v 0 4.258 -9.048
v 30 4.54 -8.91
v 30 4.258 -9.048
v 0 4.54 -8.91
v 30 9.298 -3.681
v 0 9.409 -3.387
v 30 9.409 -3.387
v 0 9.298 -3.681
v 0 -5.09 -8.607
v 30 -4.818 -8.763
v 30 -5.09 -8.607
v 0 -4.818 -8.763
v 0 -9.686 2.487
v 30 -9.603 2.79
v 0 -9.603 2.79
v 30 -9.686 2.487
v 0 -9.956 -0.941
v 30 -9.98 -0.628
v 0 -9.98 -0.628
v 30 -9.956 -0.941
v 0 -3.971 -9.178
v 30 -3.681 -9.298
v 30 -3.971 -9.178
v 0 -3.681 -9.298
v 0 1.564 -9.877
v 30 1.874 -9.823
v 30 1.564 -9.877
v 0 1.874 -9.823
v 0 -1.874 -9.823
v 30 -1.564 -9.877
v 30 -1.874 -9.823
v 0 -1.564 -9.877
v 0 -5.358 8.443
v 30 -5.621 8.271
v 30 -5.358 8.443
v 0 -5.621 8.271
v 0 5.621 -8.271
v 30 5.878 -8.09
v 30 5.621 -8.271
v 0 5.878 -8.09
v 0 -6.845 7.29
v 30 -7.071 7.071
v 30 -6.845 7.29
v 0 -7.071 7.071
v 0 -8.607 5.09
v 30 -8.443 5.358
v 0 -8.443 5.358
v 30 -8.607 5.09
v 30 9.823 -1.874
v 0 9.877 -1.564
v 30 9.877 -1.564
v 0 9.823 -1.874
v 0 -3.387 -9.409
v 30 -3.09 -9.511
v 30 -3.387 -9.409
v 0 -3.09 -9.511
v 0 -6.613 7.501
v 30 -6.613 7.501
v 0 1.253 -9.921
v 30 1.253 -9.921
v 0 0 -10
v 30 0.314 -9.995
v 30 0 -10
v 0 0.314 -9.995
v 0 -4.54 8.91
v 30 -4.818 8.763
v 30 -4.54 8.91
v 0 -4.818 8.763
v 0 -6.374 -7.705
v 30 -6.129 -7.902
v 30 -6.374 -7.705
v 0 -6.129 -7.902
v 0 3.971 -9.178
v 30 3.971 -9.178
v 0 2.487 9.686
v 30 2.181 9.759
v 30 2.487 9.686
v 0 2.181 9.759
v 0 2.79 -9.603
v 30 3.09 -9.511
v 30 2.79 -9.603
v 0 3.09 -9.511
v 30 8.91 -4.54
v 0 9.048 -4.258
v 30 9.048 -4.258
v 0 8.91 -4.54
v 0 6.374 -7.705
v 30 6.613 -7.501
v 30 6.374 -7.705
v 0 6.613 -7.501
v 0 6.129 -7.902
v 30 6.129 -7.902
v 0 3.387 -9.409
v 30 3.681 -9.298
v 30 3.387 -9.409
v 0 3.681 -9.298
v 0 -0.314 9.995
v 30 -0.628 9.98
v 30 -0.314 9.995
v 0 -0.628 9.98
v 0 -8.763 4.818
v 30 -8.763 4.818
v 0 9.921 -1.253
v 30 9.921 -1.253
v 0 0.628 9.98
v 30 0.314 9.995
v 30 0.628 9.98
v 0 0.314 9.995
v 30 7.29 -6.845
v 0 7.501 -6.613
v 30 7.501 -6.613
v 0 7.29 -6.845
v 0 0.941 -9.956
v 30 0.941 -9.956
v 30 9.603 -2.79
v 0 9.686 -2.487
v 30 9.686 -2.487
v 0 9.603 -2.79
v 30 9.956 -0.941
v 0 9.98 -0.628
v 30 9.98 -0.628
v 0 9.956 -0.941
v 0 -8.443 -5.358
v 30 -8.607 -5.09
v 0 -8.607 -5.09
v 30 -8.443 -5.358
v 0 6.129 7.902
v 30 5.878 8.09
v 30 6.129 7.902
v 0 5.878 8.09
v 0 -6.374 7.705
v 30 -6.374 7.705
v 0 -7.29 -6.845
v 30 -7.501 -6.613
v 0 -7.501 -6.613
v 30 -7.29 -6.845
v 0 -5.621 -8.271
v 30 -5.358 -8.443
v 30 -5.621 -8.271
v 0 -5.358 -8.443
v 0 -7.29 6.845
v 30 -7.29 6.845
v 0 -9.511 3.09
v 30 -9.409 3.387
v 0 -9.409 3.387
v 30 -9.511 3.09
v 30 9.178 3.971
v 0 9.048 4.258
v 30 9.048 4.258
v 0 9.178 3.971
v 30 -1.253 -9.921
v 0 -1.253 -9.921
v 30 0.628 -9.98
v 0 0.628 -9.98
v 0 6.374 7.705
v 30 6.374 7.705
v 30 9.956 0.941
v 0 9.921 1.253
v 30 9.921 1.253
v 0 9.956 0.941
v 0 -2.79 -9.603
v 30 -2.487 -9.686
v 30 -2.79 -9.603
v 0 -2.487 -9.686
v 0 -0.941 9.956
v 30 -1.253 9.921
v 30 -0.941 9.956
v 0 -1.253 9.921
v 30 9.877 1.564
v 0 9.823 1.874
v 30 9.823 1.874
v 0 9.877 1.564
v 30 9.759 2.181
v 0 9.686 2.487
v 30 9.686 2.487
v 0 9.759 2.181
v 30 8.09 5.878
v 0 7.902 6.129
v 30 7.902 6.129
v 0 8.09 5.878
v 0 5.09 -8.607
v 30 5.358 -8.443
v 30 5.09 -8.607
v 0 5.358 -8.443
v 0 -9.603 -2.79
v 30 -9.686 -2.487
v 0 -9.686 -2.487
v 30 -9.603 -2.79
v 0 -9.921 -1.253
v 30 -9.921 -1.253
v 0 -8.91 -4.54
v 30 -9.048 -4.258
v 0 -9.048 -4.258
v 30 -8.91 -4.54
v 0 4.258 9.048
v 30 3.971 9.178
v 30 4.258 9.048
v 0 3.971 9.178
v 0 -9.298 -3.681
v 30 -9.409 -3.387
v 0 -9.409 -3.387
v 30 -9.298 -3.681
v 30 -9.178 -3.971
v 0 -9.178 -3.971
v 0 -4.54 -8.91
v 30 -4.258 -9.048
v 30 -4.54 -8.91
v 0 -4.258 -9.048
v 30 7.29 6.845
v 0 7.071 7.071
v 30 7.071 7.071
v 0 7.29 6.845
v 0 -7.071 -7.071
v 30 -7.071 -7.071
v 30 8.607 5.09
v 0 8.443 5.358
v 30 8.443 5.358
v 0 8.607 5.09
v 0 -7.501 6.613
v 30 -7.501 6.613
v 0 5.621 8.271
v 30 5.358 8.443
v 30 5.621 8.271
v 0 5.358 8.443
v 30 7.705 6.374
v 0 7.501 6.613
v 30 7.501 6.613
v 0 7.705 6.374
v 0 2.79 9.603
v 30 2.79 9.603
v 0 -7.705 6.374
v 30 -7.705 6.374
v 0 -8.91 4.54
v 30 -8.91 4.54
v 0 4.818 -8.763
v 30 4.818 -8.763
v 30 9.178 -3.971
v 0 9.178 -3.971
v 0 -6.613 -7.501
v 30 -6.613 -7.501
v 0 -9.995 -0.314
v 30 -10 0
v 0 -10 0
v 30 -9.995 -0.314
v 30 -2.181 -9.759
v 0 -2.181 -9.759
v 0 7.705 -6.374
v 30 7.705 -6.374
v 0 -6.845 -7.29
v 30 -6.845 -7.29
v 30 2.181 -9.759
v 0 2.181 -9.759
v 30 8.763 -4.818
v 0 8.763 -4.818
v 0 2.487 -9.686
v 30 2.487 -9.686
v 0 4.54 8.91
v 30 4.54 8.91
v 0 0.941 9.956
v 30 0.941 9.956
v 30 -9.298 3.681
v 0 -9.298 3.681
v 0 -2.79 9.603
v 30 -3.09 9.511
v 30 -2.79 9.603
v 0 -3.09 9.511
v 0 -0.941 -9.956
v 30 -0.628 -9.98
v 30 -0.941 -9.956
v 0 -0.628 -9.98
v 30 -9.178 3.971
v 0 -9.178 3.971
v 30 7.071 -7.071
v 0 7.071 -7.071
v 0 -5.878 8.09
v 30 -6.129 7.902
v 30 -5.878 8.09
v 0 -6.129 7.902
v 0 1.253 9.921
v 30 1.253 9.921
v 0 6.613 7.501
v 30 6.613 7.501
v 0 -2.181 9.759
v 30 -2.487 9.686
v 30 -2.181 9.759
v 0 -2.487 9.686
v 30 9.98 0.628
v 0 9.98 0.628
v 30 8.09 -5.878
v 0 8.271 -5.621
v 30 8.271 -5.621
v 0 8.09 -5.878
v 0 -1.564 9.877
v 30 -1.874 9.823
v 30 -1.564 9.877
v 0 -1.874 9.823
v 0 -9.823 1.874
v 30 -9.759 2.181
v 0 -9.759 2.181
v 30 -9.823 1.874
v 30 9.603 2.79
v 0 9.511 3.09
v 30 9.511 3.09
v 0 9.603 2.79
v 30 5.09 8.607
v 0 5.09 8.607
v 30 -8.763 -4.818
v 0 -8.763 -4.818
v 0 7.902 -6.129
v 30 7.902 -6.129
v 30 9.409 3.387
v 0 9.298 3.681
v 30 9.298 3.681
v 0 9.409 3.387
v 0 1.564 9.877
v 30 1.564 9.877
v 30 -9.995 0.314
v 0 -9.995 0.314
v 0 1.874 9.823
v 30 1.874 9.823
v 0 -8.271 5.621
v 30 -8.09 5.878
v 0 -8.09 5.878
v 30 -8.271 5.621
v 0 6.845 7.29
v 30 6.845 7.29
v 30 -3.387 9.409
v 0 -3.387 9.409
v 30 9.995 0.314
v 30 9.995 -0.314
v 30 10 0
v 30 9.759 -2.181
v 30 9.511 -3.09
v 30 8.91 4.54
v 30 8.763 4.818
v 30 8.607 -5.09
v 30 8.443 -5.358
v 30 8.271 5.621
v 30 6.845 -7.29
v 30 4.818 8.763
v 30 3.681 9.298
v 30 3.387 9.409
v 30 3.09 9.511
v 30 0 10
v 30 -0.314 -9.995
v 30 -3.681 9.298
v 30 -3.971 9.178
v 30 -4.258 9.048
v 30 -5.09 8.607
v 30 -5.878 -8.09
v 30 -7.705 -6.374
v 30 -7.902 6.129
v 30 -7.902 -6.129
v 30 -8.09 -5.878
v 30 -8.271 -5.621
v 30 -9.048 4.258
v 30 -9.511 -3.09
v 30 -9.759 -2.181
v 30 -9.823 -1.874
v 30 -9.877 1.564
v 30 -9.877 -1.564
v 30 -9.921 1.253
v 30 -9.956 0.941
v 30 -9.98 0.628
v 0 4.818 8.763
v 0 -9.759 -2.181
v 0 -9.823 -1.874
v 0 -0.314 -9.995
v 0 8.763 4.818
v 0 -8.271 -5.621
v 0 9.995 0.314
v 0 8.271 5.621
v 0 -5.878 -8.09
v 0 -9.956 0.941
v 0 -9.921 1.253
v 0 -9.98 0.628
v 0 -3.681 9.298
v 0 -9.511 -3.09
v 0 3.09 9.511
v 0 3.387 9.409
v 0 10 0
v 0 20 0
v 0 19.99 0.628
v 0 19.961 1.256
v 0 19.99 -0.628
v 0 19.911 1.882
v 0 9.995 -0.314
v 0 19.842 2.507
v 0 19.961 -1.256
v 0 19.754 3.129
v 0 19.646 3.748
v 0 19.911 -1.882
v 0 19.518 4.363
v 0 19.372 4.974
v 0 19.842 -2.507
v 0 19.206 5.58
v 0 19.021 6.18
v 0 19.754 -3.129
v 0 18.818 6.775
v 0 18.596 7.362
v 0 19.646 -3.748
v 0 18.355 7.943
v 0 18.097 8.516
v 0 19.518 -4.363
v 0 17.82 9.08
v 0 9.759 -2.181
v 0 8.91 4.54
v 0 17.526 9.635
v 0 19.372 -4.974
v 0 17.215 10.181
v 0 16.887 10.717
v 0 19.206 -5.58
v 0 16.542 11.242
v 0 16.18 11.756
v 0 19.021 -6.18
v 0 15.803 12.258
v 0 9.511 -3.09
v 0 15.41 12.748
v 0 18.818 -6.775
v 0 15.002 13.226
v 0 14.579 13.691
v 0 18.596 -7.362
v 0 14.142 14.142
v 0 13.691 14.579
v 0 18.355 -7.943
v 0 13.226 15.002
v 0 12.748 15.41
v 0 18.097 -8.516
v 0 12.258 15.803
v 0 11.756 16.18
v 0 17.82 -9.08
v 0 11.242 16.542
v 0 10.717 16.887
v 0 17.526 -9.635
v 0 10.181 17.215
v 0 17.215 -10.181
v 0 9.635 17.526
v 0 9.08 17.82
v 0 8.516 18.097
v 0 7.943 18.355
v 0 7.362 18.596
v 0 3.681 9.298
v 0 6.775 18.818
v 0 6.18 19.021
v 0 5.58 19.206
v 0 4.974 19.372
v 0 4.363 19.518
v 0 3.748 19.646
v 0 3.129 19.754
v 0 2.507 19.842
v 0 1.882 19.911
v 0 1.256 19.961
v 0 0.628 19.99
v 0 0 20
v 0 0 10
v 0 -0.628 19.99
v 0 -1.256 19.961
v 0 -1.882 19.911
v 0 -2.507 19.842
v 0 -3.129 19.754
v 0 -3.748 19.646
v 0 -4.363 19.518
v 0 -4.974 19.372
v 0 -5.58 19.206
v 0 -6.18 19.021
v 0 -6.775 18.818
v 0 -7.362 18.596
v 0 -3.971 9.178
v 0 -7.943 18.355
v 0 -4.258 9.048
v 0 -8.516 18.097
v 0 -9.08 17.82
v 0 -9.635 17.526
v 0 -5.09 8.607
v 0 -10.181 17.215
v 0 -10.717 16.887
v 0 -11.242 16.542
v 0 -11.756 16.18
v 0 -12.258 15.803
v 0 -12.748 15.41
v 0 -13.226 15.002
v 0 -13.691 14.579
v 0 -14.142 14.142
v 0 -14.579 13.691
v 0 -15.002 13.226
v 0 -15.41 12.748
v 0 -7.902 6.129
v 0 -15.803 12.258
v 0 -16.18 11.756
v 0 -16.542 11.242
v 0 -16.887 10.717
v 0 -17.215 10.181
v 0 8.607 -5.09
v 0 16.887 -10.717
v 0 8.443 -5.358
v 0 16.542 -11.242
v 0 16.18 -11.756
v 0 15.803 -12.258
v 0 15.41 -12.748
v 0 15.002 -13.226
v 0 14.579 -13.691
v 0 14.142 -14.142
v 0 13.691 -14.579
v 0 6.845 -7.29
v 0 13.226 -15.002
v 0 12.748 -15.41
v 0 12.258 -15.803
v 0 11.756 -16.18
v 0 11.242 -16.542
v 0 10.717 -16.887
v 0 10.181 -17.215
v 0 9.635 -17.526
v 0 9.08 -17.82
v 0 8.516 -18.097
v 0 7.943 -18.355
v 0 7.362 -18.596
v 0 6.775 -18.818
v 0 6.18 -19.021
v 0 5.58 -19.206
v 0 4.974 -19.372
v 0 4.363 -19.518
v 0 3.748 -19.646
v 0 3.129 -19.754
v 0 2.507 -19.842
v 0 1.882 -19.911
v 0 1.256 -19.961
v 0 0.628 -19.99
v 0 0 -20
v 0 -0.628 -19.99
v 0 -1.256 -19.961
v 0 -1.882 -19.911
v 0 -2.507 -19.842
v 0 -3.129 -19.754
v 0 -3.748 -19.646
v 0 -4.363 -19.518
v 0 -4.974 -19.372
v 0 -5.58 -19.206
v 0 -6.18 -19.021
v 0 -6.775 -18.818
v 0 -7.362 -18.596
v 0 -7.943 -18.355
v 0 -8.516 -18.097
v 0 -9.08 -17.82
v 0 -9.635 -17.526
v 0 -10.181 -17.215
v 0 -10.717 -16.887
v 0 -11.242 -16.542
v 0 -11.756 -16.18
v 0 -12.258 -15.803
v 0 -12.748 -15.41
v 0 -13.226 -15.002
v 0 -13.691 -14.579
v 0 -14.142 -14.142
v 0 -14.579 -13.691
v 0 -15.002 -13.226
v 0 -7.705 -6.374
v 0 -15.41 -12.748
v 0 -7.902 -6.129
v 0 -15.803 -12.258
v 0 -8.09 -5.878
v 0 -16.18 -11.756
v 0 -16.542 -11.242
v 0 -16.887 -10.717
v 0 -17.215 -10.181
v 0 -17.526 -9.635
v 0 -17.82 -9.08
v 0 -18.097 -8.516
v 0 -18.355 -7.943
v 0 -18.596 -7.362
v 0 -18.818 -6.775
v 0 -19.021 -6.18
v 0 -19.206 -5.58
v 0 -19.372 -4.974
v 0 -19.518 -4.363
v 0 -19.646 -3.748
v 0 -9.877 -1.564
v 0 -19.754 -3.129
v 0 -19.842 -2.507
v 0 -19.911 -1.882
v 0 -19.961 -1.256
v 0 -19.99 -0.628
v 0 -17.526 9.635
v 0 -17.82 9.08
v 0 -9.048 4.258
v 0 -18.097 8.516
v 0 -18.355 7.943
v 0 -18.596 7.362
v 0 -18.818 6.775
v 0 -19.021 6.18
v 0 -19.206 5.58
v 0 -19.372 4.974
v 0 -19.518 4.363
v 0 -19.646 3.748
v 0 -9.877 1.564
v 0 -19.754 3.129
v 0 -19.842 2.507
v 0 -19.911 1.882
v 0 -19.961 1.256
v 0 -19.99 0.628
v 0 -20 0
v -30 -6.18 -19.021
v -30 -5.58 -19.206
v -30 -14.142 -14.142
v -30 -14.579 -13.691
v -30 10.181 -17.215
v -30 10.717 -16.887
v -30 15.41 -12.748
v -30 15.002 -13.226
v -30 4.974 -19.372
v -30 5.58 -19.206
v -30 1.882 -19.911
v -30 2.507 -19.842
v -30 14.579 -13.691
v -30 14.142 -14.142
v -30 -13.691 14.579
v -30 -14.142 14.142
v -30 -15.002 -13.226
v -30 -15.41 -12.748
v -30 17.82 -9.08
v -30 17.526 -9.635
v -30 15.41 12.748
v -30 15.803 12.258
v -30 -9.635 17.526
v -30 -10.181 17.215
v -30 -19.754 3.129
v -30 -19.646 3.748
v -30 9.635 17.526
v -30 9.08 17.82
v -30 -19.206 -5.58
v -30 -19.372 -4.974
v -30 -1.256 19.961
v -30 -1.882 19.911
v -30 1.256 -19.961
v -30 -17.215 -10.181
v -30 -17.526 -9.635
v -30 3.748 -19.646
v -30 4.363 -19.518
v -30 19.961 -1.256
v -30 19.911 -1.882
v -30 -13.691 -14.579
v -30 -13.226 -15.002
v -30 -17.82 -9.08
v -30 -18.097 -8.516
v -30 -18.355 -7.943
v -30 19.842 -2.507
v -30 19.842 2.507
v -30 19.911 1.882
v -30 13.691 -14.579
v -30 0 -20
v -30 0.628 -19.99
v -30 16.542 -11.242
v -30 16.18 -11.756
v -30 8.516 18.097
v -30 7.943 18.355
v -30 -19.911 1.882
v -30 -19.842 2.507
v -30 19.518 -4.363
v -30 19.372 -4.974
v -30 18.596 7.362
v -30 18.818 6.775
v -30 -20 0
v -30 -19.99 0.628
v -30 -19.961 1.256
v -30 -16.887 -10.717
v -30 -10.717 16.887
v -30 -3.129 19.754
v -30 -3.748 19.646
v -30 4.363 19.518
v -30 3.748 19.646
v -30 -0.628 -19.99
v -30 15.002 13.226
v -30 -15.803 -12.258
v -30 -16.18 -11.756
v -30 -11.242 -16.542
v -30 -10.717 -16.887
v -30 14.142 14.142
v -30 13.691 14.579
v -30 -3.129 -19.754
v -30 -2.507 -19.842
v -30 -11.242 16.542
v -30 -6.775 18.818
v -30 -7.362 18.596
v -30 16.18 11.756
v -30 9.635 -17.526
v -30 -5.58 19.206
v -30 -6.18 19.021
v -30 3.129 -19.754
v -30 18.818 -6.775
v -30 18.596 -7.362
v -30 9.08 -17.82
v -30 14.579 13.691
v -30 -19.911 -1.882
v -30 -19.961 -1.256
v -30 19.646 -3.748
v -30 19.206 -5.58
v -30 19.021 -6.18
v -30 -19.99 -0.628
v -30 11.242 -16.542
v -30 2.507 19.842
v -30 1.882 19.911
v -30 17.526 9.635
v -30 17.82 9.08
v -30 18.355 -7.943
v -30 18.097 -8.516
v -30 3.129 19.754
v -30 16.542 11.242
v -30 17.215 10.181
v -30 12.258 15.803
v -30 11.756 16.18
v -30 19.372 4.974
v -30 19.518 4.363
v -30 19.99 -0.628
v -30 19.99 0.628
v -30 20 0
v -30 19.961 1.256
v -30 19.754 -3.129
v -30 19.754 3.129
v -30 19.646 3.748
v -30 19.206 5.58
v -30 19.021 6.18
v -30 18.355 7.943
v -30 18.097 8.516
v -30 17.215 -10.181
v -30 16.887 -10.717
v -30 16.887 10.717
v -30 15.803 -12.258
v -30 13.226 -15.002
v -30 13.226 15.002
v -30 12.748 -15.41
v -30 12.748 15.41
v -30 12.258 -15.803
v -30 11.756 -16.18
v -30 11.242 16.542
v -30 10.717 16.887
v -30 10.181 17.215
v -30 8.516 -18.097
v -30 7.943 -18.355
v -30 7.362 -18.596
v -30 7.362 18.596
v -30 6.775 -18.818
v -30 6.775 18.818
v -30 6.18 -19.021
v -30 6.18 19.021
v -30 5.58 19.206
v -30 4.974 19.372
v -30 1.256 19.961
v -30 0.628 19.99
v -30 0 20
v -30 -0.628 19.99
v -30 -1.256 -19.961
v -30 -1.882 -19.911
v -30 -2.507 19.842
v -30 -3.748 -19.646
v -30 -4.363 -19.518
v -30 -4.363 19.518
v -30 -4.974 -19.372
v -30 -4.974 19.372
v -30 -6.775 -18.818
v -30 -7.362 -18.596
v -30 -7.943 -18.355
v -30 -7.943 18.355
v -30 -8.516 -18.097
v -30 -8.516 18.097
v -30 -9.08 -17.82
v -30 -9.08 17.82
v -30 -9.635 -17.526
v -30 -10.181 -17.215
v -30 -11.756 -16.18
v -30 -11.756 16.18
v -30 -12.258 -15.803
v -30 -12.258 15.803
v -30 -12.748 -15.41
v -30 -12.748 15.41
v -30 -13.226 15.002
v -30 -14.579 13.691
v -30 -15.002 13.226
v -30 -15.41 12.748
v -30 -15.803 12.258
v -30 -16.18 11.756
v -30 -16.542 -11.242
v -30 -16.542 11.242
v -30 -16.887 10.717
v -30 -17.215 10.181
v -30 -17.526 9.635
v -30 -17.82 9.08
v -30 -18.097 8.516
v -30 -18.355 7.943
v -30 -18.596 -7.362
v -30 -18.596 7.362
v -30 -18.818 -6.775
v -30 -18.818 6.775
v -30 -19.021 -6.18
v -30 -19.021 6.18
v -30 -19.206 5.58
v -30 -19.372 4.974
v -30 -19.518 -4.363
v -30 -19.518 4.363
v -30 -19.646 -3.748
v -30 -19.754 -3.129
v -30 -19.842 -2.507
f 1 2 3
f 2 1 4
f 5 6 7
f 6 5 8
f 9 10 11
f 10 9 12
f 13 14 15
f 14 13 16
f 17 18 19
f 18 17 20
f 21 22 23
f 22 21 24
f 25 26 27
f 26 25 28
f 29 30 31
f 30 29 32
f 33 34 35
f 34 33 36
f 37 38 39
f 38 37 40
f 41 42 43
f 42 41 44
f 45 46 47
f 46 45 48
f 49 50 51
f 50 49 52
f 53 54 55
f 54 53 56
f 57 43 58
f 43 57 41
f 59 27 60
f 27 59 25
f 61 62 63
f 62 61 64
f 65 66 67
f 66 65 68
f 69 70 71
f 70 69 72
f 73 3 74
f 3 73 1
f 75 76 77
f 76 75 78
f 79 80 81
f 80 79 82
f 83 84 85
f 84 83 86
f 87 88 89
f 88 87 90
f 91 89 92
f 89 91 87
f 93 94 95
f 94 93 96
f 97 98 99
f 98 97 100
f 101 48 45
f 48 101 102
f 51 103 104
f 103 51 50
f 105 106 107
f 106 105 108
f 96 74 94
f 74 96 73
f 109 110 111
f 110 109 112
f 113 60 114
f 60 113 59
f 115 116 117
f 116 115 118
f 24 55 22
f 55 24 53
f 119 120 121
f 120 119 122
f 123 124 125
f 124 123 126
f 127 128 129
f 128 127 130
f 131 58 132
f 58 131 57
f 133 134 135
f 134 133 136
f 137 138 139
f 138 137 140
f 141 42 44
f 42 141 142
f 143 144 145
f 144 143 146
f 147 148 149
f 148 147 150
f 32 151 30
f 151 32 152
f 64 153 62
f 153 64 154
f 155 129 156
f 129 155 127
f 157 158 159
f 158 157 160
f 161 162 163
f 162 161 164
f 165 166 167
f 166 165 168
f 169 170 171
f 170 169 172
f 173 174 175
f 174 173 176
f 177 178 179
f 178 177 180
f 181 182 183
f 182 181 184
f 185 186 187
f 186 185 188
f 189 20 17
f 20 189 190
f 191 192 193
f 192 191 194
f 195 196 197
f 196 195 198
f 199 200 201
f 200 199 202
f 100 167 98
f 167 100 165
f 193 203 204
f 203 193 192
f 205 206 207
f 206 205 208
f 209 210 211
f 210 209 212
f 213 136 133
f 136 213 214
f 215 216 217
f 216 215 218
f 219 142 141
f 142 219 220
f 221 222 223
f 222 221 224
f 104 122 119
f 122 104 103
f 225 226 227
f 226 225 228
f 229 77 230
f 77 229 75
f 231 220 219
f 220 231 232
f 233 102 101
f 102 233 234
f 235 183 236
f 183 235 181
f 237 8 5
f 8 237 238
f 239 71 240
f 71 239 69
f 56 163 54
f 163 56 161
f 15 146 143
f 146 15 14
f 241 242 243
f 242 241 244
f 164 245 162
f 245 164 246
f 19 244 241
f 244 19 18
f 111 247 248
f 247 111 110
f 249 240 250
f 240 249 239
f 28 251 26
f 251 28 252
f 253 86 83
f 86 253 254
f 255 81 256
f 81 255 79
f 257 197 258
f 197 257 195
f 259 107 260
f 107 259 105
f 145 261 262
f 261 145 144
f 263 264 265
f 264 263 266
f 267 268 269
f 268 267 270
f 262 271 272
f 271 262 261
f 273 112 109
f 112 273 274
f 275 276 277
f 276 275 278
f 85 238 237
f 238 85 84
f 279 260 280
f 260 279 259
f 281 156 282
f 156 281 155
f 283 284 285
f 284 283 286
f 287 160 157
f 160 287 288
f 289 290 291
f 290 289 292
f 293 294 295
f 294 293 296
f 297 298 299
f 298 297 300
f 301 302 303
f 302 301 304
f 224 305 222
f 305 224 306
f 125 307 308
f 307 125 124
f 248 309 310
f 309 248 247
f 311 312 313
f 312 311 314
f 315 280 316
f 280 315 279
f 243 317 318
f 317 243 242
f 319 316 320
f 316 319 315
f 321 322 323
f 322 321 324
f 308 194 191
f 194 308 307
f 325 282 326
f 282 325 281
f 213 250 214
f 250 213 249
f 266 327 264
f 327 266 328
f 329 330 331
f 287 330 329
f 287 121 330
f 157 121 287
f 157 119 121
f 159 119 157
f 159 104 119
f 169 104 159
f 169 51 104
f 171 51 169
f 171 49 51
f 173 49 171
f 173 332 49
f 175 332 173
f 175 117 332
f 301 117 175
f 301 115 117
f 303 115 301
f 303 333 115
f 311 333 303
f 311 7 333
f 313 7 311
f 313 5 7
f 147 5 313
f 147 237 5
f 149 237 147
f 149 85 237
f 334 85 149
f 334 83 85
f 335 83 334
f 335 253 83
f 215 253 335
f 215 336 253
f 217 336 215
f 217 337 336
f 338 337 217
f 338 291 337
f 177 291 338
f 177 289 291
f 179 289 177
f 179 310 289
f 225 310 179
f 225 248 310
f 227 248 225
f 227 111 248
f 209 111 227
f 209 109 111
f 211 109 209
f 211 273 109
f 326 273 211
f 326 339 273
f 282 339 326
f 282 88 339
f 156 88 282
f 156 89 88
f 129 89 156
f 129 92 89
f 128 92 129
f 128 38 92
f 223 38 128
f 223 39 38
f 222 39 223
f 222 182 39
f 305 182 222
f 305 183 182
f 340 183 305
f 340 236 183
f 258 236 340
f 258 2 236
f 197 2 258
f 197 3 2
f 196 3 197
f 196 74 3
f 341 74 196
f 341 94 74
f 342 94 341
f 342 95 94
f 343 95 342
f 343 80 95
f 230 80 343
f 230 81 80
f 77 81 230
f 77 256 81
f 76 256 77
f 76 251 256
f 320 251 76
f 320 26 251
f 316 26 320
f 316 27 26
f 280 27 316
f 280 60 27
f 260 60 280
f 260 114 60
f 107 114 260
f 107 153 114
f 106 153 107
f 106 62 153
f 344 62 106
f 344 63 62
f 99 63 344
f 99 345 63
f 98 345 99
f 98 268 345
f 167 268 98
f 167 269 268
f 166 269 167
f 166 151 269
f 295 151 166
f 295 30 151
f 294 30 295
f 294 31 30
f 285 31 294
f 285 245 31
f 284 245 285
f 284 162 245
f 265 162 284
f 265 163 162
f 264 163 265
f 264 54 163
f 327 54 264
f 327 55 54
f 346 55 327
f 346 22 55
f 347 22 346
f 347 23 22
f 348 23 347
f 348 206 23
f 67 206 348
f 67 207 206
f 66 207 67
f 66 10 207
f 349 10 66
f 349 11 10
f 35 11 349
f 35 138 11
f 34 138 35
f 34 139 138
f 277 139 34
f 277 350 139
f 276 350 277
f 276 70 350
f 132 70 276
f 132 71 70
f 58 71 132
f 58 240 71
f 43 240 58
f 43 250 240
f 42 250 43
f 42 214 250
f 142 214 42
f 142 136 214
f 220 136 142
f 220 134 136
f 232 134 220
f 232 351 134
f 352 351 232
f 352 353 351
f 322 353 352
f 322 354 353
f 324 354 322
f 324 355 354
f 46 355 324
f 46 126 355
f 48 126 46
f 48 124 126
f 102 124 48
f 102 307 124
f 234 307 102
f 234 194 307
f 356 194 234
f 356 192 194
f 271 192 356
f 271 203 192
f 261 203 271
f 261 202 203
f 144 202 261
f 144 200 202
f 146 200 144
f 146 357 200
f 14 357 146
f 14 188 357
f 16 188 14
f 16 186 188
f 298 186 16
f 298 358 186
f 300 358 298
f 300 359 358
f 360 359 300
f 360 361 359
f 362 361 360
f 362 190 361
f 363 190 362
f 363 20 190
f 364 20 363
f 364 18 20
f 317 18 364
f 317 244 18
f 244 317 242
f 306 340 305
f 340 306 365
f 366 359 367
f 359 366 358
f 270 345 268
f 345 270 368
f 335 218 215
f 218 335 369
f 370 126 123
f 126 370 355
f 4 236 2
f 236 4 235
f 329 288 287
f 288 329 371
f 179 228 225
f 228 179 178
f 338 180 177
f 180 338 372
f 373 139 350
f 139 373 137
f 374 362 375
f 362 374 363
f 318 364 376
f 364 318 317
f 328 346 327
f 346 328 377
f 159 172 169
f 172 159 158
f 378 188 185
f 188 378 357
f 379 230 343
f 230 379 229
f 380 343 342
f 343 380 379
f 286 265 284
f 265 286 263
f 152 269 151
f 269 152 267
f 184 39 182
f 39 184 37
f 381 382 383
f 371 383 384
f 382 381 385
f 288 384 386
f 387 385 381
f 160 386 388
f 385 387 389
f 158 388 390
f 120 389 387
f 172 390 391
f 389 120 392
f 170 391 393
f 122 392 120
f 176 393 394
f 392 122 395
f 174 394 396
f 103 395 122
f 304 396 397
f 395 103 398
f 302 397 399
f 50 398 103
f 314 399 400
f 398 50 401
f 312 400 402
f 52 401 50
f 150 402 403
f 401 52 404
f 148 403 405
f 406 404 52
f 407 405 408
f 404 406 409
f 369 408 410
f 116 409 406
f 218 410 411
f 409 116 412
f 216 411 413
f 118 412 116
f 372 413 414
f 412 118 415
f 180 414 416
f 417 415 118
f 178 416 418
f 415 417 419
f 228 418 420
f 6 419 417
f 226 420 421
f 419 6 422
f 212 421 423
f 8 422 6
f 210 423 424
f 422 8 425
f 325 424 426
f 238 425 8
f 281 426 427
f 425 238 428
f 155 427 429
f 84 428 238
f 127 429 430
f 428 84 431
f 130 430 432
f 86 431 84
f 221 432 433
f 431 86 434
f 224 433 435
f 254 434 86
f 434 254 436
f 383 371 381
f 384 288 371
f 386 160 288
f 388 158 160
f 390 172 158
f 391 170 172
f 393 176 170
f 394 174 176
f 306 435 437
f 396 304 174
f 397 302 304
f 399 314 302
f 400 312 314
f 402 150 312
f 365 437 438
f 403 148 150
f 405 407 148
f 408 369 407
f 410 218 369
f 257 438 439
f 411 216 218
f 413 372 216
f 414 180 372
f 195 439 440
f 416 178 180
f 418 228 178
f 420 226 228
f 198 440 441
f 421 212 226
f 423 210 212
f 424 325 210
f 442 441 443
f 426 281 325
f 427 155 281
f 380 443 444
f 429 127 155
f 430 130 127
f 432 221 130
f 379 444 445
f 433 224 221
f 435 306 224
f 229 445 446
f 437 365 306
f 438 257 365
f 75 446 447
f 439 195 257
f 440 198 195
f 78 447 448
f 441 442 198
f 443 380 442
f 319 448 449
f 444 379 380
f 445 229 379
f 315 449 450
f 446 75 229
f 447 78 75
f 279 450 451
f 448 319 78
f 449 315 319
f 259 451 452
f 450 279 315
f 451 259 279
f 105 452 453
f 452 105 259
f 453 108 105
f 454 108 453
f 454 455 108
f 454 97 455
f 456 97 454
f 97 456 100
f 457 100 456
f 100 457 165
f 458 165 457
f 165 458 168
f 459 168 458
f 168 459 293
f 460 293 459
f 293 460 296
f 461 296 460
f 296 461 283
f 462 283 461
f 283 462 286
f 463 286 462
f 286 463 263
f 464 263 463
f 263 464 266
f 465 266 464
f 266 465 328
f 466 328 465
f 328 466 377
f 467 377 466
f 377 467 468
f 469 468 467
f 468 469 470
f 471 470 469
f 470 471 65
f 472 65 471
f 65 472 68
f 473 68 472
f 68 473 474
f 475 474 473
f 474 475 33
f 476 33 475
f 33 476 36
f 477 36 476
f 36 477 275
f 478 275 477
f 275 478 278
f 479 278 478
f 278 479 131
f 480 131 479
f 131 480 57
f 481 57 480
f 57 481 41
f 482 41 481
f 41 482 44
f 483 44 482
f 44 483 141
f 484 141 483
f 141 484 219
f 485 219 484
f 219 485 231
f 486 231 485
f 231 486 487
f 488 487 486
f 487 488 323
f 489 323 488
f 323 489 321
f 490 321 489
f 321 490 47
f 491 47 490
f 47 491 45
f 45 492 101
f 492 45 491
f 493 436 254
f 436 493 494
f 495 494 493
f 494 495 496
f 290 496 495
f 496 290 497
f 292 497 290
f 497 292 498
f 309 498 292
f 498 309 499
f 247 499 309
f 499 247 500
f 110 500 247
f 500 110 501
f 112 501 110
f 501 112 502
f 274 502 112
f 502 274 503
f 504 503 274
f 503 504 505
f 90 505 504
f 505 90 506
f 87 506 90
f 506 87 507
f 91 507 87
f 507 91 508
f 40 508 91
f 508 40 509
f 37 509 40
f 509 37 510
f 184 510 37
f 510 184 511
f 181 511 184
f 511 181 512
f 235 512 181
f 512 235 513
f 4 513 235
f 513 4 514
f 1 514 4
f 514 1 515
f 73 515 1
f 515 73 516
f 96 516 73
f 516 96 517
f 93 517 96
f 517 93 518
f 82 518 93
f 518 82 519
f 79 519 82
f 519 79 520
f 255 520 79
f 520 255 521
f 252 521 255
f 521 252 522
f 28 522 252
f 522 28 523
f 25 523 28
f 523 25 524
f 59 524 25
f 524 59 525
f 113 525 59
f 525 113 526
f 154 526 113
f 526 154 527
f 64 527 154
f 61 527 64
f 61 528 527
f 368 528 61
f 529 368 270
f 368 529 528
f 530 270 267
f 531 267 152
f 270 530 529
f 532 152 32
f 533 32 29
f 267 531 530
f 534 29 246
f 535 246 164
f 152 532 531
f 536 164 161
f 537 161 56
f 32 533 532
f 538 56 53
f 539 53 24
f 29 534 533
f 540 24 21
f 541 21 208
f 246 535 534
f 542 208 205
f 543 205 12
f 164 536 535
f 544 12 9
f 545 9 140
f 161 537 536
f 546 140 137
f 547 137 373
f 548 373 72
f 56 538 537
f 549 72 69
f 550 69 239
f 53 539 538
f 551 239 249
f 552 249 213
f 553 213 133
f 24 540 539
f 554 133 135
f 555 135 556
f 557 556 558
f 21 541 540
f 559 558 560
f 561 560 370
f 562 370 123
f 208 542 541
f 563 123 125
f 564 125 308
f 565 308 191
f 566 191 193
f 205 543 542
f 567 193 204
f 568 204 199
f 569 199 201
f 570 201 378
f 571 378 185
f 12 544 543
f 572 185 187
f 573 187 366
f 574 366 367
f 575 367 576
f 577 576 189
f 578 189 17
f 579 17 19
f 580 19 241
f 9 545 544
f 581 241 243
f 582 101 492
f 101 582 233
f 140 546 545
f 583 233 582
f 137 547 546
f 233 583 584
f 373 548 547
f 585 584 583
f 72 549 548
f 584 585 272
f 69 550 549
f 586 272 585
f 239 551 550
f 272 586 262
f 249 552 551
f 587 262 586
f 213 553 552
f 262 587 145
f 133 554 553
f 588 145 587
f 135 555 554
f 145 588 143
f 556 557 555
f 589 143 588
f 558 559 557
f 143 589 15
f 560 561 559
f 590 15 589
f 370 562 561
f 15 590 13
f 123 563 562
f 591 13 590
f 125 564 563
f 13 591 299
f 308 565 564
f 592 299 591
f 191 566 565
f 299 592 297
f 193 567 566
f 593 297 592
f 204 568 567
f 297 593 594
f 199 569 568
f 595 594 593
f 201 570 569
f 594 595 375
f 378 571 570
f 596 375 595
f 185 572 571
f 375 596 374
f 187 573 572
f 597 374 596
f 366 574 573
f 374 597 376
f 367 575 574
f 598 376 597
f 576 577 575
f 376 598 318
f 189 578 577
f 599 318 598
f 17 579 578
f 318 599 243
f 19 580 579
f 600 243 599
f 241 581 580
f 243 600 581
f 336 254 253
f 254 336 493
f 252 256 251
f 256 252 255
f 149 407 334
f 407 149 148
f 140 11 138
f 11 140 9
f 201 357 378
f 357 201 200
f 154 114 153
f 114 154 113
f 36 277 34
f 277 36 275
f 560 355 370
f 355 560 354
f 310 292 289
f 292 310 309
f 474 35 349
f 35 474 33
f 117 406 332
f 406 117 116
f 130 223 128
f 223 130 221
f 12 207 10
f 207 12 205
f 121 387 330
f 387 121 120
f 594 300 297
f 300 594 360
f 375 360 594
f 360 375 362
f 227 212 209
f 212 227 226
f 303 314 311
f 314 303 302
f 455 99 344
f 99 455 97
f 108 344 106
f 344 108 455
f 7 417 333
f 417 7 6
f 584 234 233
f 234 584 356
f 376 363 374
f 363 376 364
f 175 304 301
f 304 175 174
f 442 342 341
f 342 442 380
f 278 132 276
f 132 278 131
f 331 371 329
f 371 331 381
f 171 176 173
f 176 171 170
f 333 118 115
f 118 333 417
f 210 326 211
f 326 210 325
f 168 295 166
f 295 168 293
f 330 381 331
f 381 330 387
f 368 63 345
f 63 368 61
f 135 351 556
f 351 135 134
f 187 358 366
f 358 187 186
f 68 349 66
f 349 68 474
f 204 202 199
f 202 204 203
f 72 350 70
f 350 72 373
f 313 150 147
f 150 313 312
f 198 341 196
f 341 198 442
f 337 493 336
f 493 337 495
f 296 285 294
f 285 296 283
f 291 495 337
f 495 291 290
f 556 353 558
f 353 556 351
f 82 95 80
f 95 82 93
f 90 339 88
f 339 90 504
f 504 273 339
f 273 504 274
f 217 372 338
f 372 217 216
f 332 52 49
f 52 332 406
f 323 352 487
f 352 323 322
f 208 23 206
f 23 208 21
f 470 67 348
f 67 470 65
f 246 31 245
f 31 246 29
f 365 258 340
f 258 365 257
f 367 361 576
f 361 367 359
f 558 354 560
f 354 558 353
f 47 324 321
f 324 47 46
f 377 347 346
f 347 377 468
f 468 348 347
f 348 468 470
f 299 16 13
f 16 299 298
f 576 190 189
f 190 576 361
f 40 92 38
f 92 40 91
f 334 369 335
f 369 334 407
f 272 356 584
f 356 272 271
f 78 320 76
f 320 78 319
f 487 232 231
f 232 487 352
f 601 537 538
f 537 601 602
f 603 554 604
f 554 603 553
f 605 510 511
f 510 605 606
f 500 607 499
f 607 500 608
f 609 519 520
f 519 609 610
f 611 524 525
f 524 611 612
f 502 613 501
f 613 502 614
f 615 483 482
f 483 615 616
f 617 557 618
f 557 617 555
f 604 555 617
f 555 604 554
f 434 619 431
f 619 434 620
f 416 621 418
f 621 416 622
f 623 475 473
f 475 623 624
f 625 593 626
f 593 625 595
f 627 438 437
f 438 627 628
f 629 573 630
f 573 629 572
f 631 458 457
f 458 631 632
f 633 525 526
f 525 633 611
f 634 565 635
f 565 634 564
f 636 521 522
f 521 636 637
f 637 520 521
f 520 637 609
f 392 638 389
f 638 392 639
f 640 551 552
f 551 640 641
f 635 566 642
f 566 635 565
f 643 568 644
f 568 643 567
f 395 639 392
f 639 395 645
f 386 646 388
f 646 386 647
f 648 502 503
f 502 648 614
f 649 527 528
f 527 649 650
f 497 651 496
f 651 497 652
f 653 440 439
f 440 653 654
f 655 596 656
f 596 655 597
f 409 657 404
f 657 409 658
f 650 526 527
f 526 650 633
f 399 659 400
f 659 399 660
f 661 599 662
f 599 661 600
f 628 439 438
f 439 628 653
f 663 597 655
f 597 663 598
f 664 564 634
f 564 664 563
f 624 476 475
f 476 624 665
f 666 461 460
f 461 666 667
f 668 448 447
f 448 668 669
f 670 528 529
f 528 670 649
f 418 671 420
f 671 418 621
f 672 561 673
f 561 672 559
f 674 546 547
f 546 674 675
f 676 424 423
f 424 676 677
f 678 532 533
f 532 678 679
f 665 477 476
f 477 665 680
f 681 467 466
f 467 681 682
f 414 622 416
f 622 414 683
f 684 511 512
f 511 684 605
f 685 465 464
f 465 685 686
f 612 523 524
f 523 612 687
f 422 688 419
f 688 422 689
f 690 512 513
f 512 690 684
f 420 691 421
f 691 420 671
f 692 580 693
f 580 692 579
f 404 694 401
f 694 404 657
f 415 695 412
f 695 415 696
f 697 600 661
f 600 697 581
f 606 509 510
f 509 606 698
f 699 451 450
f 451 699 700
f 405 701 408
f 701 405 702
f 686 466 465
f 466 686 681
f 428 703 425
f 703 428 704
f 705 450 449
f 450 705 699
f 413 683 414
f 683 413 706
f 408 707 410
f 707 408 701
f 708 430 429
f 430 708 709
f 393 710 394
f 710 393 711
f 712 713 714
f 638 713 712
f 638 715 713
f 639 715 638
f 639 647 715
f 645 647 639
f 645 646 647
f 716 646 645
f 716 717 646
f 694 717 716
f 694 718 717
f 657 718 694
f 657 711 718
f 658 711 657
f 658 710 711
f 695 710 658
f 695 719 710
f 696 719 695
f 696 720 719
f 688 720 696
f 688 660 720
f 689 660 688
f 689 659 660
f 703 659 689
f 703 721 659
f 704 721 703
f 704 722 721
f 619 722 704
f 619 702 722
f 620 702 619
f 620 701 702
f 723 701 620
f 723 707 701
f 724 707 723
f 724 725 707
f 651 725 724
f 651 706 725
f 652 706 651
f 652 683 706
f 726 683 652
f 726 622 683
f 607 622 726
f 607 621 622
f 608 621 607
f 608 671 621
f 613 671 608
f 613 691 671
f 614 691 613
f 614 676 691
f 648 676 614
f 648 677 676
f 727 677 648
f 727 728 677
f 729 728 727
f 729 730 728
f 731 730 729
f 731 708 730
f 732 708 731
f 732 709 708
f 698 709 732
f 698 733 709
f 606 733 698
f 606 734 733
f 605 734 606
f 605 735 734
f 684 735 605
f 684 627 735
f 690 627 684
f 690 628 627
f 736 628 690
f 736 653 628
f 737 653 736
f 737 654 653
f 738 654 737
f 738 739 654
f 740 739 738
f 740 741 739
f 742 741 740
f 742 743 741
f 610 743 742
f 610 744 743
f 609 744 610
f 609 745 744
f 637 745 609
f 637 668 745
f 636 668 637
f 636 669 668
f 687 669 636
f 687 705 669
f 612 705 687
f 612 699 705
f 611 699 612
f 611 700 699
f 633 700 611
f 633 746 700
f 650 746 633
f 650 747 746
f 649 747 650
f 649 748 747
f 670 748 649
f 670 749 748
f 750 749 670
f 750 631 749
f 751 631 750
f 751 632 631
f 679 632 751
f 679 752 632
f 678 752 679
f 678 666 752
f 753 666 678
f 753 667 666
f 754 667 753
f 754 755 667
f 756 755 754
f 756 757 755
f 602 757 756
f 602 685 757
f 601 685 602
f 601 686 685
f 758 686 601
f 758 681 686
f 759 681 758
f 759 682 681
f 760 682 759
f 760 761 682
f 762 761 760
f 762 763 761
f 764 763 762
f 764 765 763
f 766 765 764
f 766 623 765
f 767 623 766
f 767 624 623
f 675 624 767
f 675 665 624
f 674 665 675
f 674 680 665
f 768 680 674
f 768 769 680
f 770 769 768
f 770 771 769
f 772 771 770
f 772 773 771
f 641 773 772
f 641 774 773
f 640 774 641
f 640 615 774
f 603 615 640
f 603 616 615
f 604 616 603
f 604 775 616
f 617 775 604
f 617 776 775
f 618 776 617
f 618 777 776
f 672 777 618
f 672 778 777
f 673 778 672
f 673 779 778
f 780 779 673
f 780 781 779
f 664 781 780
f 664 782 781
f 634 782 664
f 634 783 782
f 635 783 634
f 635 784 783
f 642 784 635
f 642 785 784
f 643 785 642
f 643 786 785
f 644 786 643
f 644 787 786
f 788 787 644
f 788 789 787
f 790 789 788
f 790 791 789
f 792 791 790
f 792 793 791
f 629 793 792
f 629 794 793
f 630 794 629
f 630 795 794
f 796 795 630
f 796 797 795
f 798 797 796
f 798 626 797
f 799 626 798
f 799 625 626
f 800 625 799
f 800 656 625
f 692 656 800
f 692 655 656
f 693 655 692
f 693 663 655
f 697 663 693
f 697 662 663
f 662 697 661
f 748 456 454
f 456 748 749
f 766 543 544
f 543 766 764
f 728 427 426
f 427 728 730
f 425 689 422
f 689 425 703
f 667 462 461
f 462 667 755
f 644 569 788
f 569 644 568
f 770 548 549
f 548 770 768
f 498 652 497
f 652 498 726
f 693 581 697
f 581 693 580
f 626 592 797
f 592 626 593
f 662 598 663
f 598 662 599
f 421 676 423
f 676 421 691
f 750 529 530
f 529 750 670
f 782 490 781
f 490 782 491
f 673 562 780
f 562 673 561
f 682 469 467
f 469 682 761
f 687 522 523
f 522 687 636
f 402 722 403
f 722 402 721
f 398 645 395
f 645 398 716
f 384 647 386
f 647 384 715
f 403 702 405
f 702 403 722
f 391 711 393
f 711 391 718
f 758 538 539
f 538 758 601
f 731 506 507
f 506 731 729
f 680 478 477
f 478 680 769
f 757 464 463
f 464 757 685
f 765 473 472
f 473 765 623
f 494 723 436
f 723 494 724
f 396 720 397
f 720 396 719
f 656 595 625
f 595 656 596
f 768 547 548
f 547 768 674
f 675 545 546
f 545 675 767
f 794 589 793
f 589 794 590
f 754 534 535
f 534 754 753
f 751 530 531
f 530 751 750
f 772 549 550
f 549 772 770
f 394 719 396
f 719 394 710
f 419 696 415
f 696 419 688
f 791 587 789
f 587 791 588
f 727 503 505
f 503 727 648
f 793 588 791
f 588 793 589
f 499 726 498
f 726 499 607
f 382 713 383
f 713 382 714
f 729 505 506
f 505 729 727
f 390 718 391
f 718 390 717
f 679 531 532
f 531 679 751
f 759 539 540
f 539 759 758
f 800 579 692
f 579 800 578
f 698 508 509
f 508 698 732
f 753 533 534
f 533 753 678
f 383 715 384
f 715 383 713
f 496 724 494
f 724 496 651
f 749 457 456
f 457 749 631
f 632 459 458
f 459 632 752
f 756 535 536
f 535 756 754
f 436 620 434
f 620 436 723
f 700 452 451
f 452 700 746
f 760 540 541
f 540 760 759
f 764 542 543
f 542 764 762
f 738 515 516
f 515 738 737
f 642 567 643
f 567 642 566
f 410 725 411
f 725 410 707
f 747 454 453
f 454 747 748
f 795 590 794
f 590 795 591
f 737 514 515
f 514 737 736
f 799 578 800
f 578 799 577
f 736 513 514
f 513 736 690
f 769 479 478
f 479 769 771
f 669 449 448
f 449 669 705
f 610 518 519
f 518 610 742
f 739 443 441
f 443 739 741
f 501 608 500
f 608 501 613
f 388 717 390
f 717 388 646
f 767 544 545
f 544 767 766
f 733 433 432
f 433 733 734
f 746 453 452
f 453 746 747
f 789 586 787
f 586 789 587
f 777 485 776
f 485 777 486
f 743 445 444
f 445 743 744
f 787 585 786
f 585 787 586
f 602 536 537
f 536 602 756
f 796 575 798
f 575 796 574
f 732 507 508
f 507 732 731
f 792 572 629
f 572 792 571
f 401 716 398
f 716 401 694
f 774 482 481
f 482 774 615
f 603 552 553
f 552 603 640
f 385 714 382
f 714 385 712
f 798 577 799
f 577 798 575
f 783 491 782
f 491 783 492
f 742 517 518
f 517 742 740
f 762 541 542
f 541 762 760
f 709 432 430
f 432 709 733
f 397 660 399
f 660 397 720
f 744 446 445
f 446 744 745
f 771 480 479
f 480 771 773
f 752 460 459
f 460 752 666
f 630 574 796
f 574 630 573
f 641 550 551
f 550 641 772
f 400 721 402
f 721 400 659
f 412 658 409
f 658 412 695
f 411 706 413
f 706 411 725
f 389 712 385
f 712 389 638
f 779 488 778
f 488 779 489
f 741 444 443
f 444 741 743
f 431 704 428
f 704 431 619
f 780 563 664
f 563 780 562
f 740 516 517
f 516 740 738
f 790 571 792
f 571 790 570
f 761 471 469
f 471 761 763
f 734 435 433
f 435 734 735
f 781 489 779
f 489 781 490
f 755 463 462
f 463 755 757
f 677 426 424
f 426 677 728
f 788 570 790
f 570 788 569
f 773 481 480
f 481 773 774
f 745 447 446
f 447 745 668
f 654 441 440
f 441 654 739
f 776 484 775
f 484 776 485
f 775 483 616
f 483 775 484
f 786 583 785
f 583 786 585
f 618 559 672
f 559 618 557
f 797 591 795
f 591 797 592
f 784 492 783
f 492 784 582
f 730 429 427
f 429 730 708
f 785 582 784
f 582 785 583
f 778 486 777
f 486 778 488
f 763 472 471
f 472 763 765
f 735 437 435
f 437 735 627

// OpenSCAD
$fn=200;

color([0,1,0])
rotate([0,90,0])
cylinder(30,d=20);

color([1,0,0])
translate([-30,0,0])
rotate([0,90,0])
cylinder(30,d=40);
